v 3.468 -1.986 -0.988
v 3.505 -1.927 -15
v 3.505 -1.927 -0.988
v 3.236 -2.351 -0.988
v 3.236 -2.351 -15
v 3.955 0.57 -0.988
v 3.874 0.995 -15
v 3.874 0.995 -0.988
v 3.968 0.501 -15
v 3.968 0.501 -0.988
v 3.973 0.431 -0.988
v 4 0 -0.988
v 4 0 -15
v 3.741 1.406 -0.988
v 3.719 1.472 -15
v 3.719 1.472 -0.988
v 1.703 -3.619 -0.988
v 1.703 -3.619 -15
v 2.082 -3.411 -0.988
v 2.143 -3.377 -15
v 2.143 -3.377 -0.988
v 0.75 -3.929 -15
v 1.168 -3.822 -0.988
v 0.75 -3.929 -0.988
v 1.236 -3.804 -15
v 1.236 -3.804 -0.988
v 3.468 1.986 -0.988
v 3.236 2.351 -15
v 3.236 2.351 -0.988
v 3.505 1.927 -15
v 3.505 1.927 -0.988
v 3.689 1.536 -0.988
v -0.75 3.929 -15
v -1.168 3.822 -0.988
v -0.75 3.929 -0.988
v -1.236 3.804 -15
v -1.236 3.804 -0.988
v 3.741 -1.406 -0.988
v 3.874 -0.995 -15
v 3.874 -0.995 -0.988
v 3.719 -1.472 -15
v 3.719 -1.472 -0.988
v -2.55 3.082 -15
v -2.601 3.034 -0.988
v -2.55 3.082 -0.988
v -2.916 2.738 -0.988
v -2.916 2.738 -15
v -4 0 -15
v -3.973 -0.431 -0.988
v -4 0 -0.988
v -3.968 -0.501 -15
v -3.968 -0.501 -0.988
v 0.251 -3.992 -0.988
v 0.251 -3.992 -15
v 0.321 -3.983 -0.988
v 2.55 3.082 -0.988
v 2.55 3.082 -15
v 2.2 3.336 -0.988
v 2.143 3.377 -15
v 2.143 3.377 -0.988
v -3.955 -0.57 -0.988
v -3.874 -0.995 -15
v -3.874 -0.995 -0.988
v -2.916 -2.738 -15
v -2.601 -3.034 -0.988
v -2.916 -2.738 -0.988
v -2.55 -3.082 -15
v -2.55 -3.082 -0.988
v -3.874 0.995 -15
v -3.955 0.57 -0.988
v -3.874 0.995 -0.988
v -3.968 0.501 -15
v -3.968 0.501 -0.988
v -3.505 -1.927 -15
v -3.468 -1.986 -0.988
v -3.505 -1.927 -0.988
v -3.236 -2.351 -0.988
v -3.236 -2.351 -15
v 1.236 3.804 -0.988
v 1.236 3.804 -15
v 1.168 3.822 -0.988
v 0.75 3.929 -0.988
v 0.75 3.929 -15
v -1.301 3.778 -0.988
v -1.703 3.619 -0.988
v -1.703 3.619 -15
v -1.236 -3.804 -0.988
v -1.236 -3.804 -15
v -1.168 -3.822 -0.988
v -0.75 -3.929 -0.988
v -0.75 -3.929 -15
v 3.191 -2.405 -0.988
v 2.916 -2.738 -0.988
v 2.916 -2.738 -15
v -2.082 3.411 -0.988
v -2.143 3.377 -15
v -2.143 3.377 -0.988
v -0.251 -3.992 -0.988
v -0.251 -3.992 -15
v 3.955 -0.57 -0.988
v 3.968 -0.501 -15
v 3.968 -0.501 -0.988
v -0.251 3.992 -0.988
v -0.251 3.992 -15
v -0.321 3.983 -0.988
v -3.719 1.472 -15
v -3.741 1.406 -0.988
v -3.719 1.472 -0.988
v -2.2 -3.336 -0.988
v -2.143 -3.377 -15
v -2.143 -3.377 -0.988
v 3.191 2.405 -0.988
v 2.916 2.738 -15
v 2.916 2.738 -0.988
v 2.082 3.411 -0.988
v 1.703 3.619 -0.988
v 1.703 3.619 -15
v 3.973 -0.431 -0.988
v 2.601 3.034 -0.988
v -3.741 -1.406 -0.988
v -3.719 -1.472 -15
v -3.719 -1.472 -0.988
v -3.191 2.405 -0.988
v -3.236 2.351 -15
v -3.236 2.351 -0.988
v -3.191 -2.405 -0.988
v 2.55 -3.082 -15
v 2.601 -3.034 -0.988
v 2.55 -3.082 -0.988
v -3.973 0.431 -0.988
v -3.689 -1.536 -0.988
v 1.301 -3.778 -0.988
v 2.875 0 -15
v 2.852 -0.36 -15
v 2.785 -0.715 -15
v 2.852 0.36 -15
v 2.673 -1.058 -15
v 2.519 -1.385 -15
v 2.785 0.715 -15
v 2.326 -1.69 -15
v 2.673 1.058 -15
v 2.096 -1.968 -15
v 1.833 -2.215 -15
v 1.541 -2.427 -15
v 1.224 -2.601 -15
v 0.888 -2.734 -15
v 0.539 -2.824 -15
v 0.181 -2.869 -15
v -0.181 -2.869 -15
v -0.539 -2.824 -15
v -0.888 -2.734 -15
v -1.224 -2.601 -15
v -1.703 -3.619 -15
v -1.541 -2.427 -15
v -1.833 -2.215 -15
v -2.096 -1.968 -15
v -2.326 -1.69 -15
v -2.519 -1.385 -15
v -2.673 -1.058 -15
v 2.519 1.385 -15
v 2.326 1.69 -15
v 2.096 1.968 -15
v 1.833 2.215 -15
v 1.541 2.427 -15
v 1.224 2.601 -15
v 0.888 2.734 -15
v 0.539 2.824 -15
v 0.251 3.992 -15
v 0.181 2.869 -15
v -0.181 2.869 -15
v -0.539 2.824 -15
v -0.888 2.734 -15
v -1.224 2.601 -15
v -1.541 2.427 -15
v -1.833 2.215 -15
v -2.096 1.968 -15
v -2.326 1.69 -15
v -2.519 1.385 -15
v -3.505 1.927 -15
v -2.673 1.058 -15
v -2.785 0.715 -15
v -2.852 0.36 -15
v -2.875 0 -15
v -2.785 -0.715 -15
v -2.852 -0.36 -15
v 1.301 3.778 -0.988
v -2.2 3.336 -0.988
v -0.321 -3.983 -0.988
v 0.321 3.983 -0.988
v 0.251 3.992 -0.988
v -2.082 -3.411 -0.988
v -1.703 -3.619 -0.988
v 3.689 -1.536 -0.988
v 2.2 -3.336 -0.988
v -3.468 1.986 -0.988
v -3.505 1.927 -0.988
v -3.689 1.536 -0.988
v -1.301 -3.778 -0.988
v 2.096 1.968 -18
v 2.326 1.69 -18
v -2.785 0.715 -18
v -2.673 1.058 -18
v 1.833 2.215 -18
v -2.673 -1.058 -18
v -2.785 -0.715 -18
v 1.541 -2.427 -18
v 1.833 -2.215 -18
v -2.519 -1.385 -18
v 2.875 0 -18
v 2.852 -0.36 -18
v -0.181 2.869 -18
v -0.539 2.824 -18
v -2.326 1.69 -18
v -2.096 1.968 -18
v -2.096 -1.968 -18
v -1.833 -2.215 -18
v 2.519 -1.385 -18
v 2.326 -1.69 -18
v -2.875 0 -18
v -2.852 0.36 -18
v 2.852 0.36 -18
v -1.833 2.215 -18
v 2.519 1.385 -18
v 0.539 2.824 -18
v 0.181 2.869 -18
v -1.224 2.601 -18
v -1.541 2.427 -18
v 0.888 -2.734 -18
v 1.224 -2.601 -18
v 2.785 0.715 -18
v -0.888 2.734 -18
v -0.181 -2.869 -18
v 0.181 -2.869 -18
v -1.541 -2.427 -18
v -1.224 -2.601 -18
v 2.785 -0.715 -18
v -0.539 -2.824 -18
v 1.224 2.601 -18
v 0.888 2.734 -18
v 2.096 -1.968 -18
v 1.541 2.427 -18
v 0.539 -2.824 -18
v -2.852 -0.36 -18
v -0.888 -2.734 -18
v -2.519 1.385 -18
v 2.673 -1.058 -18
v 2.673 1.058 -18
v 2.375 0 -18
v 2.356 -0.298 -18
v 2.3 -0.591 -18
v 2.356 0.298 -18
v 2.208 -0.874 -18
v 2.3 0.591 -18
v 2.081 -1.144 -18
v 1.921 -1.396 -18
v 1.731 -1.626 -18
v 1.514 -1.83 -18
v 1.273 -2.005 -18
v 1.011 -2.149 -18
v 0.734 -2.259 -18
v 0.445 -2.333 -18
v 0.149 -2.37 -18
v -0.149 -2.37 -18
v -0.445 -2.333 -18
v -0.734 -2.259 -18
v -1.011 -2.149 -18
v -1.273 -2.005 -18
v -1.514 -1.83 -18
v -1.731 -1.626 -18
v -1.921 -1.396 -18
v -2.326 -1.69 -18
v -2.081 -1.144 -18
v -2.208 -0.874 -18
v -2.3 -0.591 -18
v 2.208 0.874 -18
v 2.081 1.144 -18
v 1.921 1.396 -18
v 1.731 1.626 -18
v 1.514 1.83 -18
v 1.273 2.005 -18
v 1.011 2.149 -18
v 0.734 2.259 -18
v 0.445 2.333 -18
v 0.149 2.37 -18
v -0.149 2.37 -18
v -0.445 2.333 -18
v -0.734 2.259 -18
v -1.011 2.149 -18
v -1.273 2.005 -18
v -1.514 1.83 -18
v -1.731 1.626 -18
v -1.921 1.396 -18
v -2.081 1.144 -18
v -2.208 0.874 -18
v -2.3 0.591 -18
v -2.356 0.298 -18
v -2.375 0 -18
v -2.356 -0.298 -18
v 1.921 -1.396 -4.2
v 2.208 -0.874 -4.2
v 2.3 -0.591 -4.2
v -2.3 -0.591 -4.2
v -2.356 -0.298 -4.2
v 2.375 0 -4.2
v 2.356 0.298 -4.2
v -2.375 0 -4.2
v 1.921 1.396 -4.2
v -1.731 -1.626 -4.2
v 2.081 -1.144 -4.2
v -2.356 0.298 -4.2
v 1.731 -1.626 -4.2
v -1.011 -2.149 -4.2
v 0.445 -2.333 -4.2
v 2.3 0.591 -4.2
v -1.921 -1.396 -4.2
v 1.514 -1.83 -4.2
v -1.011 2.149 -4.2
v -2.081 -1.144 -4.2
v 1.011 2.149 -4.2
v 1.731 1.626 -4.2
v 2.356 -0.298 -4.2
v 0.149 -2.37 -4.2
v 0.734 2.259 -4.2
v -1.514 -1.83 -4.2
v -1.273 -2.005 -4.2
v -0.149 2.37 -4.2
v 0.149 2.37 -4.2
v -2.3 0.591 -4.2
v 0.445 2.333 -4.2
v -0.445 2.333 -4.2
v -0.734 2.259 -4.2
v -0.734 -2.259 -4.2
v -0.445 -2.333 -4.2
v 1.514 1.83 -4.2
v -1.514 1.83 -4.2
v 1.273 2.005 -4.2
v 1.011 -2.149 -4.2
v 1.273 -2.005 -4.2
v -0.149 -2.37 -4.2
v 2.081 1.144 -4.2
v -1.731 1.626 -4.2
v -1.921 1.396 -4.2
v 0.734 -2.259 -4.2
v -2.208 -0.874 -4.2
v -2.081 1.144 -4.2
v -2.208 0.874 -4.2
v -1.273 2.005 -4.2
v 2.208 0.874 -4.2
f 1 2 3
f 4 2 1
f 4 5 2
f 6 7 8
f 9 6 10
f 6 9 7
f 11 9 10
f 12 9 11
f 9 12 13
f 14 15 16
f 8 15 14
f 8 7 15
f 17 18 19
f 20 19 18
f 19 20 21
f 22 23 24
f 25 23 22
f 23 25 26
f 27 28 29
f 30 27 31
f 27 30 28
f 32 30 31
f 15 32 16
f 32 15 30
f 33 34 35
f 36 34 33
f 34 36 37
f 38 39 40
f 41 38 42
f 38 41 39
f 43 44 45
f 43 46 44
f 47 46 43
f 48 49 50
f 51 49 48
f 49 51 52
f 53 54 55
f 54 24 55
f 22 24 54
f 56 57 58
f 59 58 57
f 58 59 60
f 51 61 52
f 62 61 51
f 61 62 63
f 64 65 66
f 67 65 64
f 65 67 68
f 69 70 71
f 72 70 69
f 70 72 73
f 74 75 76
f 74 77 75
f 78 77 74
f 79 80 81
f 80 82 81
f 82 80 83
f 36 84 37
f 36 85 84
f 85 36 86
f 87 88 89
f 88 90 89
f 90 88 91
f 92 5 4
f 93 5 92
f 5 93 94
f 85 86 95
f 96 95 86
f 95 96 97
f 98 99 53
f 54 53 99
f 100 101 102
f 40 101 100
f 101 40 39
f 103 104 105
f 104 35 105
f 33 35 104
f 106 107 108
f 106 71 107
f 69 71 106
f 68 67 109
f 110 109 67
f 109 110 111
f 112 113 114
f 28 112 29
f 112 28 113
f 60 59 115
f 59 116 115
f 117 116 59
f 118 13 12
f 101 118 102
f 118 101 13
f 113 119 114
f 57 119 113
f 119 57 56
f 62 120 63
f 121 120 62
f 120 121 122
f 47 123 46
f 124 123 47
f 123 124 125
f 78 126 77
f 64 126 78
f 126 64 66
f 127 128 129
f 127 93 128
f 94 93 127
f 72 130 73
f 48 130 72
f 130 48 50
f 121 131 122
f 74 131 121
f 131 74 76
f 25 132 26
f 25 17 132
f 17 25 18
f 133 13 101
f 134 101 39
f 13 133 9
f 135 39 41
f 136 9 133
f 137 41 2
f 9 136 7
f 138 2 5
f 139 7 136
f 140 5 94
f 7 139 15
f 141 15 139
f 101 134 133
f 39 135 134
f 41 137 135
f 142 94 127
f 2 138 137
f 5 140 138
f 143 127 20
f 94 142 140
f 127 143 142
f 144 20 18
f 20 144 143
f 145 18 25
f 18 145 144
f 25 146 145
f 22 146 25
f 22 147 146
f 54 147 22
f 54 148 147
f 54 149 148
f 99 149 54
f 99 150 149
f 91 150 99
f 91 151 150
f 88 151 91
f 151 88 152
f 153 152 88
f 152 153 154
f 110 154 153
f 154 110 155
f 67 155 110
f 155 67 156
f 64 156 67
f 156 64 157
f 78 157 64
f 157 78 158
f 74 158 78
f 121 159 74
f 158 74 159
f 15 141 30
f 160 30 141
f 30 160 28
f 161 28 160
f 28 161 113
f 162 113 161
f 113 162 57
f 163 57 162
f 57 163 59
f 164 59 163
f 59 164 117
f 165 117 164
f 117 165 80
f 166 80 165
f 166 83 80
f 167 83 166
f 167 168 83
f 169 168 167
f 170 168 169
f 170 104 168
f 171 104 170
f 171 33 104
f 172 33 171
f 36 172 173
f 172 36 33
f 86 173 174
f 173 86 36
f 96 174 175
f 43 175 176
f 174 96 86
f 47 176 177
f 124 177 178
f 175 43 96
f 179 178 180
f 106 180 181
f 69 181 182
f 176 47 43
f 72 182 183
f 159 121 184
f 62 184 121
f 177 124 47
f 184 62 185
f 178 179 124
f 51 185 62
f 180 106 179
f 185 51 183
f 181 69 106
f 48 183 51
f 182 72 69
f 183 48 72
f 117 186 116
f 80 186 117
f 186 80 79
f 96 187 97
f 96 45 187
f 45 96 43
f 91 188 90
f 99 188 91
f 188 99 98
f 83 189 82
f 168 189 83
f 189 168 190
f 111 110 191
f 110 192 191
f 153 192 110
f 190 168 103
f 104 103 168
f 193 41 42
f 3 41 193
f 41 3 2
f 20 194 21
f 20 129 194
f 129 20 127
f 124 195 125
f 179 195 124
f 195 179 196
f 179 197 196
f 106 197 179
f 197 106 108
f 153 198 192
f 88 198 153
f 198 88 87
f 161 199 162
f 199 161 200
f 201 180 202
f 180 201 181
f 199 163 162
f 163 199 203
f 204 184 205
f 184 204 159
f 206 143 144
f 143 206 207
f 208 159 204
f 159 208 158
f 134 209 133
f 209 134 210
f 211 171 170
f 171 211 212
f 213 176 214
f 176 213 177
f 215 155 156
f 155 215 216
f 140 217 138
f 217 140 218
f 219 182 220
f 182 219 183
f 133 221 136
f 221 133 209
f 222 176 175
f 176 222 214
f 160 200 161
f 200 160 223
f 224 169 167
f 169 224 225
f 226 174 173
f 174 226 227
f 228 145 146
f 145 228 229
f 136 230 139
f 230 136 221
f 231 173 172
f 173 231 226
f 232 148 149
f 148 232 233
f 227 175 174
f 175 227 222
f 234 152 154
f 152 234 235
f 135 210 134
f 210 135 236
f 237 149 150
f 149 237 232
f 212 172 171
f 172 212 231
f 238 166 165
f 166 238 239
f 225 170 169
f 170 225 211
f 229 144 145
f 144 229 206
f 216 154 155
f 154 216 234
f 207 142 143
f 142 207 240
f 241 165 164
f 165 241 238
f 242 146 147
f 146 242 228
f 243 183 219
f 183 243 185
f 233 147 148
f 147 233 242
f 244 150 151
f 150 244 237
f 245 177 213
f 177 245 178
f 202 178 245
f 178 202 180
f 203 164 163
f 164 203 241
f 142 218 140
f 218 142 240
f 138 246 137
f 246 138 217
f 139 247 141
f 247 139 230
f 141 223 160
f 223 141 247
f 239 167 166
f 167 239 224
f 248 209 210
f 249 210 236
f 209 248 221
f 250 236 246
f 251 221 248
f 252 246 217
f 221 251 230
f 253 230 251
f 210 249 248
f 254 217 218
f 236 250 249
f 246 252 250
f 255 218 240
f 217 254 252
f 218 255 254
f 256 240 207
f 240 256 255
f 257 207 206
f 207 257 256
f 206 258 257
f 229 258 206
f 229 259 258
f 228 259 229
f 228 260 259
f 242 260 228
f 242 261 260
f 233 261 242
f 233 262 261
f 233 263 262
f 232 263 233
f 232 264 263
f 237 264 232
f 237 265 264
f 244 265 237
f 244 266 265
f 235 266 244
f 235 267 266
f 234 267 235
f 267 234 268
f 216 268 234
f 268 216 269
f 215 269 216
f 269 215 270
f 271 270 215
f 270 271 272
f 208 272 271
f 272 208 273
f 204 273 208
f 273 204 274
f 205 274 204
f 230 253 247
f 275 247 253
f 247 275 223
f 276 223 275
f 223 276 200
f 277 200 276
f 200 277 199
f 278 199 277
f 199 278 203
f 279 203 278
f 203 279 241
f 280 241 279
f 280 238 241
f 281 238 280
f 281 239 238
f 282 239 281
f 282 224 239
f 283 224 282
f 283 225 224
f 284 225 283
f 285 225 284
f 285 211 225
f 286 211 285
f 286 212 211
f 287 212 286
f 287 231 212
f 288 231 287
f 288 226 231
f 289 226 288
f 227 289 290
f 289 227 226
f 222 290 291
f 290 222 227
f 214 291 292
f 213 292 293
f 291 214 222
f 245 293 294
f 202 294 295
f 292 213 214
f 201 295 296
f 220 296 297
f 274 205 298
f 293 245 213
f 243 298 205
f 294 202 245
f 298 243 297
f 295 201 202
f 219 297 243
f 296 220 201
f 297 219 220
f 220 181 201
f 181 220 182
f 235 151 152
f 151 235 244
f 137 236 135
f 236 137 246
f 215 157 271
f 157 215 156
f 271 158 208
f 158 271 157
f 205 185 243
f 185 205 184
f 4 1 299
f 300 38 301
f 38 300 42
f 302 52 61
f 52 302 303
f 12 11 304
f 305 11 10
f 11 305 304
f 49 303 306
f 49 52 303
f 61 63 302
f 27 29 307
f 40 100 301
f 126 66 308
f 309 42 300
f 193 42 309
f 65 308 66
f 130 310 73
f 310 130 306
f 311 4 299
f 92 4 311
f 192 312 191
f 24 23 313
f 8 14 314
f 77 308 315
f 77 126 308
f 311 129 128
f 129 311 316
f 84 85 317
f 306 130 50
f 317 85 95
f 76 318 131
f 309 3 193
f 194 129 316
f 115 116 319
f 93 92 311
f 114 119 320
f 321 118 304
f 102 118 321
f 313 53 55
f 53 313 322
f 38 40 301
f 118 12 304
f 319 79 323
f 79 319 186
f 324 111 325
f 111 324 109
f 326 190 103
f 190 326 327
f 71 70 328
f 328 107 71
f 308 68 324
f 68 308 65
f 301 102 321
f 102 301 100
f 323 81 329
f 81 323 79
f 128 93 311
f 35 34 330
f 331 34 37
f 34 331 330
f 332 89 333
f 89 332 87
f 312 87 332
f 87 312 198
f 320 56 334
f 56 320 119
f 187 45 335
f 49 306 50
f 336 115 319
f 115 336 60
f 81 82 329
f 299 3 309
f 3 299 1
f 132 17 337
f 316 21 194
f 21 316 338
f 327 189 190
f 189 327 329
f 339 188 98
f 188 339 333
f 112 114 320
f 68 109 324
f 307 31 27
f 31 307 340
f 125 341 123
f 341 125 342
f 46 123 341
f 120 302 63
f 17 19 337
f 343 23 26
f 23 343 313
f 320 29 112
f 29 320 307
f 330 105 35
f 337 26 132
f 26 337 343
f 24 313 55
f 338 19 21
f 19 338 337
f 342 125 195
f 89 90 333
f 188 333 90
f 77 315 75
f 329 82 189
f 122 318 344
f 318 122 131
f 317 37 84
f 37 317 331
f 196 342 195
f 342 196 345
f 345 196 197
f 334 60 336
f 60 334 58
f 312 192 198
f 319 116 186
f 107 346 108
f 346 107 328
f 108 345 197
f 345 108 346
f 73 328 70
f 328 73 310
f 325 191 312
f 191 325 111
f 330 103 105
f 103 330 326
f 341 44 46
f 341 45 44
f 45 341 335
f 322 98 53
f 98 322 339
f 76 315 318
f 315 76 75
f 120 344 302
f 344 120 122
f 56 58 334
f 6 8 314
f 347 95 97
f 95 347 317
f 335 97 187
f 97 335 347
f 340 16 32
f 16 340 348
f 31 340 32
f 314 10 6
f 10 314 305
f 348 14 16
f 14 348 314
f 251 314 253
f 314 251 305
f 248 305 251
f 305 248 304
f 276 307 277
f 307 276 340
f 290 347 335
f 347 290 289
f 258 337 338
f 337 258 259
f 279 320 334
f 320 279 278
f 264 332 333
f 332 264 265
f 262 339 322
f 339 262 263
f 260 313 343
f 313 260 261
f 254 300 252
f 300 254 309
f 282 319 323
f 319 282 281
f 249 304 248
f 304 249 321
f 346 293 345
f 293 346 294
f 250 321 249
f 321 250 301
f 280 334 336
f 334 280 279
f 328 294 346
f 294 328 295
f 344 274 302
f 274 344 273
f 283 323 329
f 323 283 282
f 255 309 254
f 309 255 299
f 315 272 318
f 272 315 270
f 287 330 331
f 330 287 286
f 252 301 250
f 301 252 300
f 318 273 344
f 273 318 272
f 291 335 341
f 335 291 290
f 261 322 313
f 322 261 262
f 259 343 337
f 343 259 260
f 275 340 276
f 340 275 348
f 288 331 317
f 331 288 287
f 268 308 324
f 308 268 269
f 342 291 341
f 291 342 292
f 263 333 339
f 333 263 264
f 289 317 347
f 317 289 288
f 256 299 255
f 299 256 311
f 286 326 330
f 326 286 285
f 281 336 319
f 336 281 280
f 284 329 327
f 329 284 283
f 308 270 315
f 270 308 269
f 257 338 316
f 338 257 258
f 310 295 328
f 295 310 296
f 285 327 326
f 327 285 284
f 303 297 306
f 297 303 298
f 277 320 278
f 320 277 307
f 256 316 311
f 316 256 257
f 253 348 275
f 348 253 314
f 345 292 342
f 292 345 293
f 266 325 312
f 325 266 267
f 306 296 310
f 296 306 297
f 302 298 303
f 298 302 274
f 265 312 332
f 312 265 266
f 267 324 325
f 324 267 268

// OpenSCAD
$fn = 50;

difference() {
	union() {
		translate(v = [0, 0, -15.0]) {
			cylinder(h = 15, r = 4.0);
		}
		#translate(v = [0, 0, -18.0]) {
			cylinder(h = 18, r = 2.875);
		}
	}
	union() {
		translate(v = [0, 0, 0]) {
			rotate(a = [0, 0, 0]) {
				difference() {
					union() {
						translate(v = [0, 0, -18.0]) {
							cylinder(h = 18, r = 2.25);
						}
						translate(v = [0, 0, -4.2]) {
							cylinder(h = 4.2, r1 = 2.375, r2 = 4.5);
						}
						translate(v = [0, 0, -18.0]) {
							cylinder(h = 18, r = 2.375);
						}
						translate(v = [0, 0, -18.0]) {
							cylinder(h = 18, r = 2.25);
						}
					}
					union();
				}
			}
		}
	}
}
